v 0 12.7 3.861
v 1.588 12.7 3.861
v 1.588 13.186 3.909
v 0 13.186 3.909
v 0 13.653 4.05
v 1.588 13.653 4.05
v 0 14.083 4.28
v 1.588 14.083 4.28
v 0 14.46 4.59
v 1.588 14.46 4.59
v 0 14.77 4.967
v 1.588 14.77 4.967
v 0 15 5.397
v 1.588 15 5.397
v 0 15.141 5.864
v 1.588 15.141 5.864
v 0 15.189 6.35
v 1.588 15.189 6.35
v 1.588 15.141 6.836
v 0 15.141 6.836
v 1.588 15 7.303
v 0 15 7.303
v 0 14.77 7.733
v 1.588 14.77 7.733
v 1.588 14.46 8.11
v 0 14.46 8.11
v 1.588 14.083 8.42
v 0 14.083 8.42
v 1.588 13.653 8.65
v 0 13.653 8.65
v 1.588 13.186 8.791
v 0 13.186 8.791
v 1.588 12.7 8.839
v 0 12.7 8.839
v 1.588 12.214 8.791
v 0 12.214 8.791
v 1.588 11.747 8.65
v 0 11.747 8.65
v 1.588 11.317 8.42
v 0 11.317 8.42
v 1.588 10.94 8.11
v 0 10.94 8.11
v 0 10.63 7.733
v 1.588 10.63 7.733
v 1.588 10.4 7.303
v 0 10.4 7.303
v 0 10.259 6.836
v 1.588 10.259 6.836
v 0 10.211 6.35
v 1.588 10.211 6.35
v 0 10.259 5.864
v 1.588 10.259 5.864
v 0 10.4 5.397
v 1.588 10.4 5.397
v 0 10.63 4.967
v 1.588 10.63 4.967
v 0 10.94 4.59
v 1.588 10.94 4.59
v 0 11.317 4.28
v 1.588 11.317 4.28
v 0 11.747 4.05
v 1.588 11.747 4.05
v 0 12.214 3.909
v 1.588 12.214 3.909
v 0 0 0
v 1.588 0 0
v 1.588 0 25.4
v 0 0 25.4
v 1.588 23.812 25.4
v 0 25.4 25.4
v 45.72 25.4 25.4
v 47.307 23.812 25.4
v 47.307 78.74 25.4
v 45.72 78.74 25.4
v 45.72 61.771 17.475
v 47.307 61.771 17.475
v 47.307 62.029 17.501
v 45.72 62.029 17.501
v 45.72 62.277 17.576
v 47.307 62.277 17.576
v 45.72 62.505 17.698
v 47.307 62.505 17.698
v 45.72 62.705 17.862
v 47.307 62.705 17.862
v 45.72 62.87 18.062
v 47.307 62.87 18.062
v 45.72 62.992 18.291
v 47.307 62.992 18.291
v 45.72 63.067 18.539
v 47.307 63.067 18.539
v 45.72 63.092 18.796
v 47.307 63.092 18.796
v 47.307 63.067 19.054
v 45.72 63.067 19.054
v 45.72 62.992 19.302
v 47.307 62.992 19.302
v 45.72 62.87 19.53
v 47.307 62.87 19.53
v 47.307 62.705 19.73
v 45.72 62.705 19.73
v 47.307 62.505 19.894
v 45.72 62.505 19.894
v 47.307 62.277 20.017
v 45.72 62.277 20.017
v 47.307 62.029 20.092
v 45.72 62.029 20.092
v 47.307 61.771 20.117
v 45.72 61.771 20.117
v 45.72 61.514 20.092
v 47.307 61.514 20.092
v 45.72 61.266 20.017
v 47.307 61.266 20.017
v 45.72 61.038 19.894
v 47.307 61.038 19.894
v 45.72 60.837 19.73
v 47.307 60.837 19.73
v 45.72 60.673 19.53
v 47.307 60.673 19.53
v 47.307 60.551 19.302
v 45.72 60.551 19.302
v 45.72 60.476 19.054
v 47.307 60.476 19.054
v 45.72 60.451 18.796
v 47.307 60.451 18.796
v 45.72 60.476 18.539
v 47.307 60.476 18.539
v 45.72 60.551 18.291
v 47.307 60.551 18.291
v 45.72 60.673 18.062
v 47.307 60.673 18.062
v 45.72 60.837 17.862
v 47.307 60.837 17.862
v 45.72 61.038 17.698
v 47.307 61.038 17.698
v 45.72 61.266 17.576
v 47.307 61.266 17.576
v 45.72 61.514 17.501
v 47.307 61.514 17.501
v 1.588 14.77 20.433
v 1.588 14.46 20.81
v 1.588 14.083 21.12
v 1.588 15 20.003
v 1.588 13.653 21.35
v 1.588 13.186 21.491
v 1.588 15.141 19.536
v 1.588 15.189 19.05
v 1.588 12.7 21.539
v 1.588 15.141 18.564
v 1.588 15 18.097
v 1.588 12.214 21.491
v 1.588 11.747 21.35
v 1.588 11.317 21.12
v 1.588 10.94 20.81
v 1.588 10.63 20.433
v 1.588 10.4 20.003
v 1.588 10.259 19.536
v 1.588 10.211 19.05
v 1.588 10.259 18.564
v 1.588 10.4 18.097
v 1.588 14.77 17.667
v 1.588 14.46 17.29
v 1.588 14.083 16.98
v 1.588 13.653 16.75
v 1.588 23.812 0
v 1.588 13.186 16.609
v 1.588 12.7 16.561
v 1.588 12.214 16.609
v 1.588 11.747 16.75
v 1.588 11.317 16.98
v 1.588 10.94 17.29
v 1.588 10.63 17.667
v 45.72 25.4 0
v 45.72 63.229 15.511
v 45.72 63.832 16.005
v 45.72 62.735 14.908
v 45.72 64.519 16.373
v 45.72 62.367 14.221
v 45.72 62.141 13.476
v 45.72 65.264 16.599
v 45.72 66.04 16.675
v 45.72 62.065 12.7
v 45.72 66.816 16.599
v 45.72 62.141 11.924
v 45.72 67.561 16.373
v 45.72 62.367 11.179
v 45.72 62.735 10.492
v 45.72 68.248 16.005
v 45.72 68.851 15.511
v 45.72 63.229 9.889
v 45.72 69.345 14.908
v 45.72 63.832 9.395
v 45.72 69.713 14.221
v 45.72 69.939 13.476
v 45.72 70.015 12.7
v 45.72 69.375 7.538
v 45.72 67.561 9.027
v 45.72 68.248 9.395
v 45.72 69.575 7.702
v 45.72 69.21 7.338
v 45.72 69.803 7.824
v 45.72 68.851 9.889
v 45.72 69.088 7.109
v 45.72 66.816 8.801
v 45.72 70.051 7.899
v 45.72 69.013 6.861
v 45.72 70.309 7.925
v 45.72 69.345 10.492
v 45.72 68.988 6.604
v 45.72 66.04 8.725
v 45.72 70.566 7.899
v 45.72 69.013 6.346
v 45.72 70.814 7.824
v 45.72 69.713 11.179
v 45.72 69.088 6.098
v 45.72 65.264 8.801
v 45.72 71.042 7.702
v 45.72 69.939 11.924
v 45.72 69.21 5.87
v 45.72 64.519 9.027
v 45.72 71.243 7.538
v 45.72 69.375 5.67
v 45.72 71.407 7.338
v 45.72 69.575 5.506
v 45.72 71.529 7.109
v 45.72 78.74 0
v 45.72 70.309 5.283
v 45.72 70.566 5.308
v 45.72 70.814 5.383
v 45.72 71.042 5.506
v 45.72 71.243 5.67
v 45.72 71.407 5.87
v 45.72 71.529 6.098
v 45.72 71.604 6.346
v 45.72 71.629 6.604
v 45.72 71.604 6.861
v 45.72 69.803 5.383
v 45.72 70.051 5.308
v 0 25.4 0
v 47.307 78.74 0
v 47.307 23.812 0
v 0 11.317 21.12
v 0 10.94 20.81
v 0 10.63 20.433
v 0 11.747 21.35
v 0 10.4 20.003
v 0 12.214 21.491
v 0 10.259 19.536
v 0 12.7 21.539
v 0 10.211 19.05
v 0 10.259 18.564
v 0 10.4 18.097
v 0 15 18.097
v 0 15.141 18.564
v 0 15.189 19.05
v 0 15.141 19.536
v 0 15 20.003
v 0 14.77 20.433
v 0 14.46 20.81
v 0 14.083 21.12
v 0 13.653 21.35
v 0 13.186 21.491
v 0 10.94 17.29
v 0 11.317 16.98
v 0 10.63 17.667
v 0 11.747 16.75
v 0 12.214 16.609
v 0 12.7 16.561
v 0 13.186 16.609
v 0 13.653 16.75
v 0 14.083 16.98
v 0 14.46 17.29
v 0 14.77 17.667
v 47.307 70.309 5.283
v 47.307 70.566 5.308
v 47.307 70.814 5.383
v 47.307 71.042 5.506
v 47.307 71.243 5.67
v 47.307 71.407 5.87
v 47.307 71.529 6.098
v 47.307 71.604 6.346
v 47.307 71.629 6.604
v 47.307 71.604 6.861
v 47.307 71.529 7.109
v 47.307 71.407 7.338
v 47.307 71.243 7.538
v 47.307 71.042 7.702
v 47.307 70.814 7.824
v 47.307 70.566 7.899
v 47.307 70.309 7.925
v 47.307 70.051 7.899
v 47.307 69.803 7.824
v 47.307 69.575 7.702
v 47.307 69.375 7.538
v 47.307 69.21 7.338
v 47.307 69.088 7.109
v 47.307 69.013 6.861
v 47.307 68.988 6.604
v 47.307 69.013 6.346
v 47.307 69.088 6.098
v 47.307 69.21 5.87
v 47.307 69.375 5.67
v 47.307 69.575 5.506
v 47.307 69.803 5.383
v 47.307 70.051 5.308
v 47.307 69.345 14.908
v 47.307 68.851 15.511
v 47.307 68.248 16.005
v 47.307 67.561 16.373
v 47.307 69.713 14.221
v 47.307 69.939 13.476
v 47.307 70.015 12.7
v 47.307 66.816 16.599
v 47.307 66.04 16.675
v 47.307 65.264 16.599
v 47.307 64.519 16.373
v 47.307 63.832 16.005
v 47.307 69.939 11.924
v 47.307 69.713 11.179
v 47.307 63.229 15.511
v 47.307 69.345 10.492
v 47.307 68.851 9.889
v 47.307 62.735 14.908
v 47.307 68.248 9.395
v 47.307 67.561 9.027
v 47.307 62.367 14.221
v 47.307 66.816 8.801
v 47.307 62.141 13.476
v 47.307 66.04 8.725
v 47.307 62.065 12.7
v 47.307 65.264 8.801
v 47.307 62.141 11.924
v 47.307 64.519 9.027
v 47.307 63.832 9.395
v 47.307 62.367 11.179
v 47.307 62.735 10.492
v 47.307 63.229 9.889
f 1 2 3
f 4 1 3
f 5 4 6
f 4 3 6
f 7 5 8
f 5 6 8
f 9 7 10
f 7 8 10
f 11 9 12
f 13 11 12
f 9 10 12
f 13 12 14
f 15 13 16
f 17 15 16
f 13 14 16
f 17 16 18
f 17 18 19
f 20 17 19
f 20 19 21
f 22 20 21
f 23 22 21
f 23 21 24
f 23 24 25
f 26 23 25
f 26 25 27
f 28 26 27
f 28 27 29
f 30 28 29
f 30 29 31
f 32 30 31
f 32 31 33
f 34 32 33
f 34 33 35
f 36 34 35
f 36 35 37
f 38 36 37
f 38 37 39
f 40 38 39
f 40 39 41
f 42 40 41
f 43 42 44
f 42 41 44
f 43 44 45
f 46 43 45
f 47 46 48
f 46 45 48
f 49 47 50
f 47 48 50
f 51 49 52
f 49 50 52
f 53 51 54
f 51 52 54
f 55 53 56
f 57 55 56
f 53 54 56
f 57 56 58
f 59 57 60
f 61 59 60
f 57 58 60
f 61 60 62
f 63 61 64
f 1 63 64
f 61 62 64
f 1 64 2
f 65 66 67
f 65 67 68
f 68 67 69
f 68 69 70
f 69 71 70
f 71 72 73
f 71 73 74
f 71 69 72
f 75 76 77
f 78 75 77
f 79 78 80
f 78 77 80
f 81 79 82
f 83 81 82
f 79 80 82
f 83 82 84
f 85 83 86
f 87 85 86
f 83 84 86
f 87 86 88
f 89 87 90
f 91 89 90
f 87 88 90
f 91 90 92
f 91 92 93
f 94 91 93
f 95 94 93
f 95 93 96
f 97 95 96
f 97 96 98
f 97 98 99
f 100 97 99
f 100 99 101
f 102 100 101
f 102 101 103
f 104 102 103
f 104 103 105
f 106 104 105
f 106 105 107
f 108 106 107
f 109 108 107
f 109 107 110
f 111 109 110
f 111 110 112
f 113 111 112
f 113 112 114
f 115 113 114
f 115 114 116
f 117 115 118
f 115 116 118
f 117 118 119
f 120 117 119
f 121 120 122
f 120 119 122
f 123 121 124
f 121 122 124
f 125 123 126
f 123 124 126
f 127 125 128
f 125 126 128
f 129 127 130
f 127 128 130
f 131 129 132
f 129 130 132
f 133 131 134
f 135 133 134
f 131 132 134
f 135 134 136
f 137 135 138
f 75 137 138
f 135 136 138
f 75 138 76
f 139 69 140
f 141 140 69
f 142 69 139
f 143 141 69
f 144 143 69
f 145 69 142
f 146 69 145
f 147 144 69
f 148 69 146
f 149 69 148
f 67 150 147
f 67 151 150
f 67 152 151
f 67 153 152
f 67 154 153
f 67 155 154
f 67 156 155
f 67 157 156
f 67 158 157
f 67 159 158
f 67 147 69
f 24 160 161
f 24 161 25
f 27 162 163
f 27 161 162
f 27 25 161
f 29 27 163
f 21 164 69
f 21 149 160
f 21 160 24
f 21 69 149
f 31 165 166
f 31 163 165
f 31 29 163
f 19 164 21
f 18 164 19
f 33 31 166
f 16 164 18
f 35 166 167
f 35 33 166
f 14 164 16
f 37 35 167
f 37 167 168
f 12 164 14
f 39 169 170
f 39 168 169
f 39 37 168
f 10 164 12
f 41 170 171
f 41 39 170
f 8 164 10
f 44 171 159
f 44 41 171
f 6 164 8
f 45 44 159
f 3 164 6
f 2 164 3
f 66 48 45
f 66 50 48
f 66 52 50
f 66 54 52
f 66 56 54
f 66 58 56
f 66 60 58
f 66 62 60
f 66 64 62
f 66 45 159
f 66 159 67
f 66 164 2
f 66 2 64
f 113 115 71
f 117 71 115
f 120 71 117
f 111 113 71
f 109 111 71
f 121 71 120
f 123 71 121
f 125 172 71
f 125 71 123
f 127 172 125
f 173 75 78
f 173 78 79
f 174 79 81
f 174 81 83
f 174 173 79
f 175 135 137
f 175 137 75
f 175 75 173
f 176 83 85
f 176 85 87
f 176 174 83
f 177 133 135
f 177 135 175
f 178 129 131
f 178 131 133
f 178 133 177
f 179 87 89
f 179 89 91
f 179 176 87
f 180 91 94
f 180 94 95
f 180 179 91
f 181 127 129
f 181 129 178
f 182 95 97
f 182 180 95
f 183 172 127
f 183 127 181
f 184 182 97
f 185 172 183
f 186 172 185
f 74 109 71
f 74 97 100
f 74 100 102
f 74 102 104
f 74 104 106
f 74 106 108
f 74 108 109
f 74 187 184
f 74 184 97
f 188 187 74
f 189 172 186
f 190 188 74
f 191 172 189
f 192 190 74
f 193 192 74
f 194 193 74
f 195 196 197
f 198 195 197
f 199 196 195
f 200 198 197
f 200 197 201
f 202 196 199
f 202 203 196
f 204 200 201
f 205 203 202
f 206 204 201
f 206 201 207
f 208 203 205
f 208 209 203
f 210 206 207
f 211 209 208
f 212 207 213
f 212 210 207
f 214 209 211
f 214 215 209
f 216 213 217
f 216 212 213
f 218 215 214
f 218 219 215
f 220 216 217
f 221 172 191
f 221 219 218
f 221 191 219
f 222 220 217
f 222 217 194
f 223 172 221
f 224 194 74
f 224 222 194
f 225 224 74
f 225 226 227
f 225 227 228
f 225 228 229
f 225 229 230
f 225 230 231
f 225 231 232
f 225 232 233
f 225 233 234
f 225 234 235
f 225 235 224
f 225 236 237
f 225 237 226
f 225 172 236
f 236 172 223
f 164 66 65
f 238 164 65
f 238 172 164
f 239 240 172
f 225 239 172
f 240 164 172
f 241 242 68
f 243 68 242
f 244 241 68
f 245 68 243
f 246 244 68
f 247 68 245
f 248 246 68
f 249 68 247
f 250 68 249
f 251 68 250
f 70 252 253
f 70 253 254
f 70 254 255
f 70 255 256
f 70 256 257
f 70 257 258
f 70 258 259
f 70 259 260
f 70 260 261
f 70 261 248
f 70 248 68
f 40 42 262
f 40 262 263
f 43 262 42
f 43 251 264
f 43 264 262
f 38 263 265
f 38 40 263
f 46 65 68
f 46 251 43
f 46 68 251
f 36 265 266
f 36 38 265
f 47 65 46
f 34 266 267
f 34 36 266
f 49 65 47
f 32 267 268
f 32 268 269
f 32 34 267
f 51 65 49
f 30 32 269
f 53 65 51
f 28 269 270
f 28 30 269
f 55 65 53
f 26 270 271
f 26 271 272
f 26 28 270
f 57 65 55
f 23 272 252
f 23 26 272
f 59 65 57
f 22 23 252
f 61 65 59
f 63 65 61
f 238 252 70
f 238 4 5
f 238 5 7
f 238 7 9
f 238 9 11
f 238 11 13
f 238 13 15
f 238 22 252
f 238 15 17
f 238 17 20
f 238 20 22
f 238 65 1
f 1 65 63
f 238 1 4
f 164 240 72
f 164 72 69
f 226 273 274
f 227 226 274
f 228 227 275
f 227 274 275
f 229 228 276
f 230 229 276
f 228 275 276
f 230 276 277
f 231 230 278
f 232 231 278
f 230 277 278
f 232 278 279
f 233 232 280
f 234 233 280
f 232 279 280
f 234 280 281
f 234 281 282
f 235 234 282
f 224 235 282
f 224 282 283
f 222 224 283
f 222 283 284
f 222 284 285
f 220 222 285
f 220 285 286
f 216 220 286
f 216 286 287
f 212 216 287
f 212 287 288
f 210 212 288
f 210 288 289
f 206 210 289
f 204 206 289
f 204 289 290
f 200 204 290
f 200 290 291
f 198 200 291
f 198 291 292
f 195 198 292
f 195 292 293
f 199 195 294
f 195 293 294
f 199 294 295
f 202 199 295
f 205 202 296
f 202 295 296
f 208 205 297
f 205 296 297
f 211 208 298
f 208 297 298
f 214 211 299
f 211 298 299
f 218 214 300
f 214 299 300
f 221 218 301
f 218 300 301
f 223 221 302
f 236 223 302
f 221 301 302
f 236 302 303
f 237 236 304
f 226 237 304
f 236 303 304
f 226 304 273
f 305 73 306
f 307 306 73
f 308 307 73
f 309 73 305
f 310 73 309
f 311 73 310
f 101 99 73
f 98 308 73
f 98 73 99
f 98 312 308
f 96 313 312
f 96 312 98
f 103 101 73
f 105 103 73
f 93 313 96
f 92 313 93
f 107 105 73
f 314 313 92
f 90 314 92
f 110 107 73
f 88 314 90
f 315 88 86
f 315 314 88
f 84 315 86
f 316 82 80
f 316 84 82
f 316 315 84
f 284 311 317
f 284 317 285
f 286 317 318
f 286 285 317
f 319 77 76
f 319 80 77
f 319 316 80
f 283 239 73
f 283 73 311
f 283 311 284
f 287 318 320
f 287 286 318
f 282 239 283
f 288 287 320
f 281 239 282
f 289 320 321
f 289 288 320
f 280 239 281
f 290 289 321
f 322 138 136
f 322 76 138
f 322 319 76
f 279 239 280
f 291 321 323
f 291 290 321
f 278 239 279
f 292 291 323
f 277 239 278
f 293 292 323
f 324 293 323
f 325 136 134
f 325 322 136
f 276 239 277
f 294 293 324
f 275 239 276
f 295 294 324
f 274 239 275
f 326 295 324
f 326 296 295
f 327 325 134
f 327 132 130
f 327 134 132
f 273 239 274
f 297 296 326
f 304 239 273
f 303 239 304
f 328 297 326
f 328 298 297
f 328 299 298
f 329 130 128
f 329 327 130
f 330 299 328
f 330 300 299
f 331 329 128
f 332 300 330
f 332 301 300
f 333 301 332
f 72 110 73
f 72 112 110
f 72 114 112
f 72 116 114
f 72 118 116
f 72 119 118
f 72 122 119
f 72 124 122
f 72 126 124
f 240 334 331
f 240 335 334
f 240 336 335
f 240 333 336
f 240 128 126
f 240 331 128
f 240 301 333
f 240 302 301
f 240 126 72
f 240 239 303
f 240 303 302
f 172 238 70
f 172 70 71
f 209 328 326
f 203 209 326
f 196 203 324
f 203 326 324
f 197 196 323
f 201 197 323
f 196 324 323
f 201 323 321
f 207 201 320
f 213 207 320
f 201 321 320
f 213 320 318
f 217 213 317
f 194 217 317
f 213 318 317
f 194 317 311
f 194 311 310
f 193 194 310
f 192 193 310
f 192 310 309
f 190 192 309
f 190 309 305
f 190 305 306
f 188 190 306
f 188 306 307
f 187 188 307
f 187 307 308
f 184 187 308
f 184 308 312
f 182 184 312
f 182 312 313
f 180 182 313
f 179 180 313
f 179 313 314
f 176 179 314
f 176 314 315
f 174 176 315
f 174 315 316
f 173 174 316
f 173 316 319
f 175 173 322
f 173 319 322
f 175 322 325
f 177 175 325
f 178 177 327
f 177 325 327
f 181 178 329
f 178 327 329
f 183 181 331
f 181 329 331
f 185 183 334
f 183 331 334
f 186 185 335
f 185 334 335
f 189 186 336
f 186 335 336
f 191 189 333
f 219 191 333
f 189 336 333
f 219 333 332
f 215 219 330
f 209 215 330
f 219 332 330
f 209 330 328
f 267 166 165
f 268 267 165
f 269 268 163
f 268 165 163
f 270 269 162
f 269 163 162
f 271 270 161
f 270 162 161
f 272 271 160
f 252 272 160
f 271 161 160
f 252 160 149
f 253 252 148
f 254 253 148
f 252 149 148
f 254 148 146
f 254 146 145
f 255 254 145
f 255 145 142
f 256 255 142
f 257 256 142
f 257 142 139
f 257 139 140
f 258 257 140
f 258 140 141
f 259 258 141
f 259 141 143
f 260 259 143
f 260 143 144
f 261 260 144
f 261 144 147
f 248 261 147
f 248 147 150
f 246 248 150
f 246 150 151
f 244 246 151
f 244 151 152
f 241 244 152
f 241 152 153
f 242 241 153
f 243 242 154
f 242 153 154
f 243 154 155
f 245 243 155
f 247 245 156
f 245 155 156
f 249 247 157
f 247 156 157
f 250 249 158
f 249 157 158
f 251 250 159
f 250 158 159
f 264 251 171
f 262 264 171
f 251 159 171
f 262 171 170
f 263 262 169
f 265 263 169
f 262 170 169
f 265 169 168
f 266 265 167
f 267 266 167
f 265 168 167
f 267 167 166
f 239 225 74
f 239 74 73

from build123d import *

# Parameters (mm, degrees)
EXTRUDE_THIN1_DEPTH = 25.4
SKETCH2_R           = 3.9751
SKETCH2_R_2         = 1.3208
CUT_EXTRUDE1_DEPTH  = 48.307499936
SKETCH3_R           = 2.4892
CUT_EXTRUDE2_DEPTH  = 2.5875


with BuildPart() as part:
    # Sketch1 → Extrude-Thin1 (new body)
    with BuildSketch(Plane.XY):
        Polygon((0, 0), (0, 25.4), (45.719999936, 25.4), (45.719999936, 78.74), (47.307499936, 78.74), (47.307499936, 23.8125), (1.5875, 23.8125), (1.5875, 0), align=None)
    extrude(amount=EXTRUDE_THIN1_DEPTH)

    # Sketch2 → Cut-Extrude1 (cut, through all)
    with BuildSketch(Plane(origin=(47.307499936, 0, 0), x_dir=(0, 0, -1), z_dir=(1, 0, 0))):
        with Locations((-12.7, 66.04)):
            Circle(SKETCH2_R)
        with Locations((-18.796293344, 61.771329445)):
            Circle(SKETCH2_R_2)
        with Locations((-6.603706656, 70.308670555)):
            Circle(SKETCH2_R_2)
    extrude(amount=-CUT_EXTRUDE1_DEPTH, mode=Mode.SUBTRACT)

    # Sketch3 → Cut-Extrude2 (cut, through all)
    with BuildSketch(Plane(origin=(1.5875, 0, 0), x_dir=(0, 0, -1), z_dir=(1, 0, 0))):
        with Locations((-19.05, 12.7)):
            Circle(SKETCH3_R)
        with Locations((-6.35, 12.7)):
            Circle(SKETCH3_R)
    extrude(amount=-CUT_EXTRUDE2_DEPTH, mode=Mode.SUBTRACT)


solid = part.part
